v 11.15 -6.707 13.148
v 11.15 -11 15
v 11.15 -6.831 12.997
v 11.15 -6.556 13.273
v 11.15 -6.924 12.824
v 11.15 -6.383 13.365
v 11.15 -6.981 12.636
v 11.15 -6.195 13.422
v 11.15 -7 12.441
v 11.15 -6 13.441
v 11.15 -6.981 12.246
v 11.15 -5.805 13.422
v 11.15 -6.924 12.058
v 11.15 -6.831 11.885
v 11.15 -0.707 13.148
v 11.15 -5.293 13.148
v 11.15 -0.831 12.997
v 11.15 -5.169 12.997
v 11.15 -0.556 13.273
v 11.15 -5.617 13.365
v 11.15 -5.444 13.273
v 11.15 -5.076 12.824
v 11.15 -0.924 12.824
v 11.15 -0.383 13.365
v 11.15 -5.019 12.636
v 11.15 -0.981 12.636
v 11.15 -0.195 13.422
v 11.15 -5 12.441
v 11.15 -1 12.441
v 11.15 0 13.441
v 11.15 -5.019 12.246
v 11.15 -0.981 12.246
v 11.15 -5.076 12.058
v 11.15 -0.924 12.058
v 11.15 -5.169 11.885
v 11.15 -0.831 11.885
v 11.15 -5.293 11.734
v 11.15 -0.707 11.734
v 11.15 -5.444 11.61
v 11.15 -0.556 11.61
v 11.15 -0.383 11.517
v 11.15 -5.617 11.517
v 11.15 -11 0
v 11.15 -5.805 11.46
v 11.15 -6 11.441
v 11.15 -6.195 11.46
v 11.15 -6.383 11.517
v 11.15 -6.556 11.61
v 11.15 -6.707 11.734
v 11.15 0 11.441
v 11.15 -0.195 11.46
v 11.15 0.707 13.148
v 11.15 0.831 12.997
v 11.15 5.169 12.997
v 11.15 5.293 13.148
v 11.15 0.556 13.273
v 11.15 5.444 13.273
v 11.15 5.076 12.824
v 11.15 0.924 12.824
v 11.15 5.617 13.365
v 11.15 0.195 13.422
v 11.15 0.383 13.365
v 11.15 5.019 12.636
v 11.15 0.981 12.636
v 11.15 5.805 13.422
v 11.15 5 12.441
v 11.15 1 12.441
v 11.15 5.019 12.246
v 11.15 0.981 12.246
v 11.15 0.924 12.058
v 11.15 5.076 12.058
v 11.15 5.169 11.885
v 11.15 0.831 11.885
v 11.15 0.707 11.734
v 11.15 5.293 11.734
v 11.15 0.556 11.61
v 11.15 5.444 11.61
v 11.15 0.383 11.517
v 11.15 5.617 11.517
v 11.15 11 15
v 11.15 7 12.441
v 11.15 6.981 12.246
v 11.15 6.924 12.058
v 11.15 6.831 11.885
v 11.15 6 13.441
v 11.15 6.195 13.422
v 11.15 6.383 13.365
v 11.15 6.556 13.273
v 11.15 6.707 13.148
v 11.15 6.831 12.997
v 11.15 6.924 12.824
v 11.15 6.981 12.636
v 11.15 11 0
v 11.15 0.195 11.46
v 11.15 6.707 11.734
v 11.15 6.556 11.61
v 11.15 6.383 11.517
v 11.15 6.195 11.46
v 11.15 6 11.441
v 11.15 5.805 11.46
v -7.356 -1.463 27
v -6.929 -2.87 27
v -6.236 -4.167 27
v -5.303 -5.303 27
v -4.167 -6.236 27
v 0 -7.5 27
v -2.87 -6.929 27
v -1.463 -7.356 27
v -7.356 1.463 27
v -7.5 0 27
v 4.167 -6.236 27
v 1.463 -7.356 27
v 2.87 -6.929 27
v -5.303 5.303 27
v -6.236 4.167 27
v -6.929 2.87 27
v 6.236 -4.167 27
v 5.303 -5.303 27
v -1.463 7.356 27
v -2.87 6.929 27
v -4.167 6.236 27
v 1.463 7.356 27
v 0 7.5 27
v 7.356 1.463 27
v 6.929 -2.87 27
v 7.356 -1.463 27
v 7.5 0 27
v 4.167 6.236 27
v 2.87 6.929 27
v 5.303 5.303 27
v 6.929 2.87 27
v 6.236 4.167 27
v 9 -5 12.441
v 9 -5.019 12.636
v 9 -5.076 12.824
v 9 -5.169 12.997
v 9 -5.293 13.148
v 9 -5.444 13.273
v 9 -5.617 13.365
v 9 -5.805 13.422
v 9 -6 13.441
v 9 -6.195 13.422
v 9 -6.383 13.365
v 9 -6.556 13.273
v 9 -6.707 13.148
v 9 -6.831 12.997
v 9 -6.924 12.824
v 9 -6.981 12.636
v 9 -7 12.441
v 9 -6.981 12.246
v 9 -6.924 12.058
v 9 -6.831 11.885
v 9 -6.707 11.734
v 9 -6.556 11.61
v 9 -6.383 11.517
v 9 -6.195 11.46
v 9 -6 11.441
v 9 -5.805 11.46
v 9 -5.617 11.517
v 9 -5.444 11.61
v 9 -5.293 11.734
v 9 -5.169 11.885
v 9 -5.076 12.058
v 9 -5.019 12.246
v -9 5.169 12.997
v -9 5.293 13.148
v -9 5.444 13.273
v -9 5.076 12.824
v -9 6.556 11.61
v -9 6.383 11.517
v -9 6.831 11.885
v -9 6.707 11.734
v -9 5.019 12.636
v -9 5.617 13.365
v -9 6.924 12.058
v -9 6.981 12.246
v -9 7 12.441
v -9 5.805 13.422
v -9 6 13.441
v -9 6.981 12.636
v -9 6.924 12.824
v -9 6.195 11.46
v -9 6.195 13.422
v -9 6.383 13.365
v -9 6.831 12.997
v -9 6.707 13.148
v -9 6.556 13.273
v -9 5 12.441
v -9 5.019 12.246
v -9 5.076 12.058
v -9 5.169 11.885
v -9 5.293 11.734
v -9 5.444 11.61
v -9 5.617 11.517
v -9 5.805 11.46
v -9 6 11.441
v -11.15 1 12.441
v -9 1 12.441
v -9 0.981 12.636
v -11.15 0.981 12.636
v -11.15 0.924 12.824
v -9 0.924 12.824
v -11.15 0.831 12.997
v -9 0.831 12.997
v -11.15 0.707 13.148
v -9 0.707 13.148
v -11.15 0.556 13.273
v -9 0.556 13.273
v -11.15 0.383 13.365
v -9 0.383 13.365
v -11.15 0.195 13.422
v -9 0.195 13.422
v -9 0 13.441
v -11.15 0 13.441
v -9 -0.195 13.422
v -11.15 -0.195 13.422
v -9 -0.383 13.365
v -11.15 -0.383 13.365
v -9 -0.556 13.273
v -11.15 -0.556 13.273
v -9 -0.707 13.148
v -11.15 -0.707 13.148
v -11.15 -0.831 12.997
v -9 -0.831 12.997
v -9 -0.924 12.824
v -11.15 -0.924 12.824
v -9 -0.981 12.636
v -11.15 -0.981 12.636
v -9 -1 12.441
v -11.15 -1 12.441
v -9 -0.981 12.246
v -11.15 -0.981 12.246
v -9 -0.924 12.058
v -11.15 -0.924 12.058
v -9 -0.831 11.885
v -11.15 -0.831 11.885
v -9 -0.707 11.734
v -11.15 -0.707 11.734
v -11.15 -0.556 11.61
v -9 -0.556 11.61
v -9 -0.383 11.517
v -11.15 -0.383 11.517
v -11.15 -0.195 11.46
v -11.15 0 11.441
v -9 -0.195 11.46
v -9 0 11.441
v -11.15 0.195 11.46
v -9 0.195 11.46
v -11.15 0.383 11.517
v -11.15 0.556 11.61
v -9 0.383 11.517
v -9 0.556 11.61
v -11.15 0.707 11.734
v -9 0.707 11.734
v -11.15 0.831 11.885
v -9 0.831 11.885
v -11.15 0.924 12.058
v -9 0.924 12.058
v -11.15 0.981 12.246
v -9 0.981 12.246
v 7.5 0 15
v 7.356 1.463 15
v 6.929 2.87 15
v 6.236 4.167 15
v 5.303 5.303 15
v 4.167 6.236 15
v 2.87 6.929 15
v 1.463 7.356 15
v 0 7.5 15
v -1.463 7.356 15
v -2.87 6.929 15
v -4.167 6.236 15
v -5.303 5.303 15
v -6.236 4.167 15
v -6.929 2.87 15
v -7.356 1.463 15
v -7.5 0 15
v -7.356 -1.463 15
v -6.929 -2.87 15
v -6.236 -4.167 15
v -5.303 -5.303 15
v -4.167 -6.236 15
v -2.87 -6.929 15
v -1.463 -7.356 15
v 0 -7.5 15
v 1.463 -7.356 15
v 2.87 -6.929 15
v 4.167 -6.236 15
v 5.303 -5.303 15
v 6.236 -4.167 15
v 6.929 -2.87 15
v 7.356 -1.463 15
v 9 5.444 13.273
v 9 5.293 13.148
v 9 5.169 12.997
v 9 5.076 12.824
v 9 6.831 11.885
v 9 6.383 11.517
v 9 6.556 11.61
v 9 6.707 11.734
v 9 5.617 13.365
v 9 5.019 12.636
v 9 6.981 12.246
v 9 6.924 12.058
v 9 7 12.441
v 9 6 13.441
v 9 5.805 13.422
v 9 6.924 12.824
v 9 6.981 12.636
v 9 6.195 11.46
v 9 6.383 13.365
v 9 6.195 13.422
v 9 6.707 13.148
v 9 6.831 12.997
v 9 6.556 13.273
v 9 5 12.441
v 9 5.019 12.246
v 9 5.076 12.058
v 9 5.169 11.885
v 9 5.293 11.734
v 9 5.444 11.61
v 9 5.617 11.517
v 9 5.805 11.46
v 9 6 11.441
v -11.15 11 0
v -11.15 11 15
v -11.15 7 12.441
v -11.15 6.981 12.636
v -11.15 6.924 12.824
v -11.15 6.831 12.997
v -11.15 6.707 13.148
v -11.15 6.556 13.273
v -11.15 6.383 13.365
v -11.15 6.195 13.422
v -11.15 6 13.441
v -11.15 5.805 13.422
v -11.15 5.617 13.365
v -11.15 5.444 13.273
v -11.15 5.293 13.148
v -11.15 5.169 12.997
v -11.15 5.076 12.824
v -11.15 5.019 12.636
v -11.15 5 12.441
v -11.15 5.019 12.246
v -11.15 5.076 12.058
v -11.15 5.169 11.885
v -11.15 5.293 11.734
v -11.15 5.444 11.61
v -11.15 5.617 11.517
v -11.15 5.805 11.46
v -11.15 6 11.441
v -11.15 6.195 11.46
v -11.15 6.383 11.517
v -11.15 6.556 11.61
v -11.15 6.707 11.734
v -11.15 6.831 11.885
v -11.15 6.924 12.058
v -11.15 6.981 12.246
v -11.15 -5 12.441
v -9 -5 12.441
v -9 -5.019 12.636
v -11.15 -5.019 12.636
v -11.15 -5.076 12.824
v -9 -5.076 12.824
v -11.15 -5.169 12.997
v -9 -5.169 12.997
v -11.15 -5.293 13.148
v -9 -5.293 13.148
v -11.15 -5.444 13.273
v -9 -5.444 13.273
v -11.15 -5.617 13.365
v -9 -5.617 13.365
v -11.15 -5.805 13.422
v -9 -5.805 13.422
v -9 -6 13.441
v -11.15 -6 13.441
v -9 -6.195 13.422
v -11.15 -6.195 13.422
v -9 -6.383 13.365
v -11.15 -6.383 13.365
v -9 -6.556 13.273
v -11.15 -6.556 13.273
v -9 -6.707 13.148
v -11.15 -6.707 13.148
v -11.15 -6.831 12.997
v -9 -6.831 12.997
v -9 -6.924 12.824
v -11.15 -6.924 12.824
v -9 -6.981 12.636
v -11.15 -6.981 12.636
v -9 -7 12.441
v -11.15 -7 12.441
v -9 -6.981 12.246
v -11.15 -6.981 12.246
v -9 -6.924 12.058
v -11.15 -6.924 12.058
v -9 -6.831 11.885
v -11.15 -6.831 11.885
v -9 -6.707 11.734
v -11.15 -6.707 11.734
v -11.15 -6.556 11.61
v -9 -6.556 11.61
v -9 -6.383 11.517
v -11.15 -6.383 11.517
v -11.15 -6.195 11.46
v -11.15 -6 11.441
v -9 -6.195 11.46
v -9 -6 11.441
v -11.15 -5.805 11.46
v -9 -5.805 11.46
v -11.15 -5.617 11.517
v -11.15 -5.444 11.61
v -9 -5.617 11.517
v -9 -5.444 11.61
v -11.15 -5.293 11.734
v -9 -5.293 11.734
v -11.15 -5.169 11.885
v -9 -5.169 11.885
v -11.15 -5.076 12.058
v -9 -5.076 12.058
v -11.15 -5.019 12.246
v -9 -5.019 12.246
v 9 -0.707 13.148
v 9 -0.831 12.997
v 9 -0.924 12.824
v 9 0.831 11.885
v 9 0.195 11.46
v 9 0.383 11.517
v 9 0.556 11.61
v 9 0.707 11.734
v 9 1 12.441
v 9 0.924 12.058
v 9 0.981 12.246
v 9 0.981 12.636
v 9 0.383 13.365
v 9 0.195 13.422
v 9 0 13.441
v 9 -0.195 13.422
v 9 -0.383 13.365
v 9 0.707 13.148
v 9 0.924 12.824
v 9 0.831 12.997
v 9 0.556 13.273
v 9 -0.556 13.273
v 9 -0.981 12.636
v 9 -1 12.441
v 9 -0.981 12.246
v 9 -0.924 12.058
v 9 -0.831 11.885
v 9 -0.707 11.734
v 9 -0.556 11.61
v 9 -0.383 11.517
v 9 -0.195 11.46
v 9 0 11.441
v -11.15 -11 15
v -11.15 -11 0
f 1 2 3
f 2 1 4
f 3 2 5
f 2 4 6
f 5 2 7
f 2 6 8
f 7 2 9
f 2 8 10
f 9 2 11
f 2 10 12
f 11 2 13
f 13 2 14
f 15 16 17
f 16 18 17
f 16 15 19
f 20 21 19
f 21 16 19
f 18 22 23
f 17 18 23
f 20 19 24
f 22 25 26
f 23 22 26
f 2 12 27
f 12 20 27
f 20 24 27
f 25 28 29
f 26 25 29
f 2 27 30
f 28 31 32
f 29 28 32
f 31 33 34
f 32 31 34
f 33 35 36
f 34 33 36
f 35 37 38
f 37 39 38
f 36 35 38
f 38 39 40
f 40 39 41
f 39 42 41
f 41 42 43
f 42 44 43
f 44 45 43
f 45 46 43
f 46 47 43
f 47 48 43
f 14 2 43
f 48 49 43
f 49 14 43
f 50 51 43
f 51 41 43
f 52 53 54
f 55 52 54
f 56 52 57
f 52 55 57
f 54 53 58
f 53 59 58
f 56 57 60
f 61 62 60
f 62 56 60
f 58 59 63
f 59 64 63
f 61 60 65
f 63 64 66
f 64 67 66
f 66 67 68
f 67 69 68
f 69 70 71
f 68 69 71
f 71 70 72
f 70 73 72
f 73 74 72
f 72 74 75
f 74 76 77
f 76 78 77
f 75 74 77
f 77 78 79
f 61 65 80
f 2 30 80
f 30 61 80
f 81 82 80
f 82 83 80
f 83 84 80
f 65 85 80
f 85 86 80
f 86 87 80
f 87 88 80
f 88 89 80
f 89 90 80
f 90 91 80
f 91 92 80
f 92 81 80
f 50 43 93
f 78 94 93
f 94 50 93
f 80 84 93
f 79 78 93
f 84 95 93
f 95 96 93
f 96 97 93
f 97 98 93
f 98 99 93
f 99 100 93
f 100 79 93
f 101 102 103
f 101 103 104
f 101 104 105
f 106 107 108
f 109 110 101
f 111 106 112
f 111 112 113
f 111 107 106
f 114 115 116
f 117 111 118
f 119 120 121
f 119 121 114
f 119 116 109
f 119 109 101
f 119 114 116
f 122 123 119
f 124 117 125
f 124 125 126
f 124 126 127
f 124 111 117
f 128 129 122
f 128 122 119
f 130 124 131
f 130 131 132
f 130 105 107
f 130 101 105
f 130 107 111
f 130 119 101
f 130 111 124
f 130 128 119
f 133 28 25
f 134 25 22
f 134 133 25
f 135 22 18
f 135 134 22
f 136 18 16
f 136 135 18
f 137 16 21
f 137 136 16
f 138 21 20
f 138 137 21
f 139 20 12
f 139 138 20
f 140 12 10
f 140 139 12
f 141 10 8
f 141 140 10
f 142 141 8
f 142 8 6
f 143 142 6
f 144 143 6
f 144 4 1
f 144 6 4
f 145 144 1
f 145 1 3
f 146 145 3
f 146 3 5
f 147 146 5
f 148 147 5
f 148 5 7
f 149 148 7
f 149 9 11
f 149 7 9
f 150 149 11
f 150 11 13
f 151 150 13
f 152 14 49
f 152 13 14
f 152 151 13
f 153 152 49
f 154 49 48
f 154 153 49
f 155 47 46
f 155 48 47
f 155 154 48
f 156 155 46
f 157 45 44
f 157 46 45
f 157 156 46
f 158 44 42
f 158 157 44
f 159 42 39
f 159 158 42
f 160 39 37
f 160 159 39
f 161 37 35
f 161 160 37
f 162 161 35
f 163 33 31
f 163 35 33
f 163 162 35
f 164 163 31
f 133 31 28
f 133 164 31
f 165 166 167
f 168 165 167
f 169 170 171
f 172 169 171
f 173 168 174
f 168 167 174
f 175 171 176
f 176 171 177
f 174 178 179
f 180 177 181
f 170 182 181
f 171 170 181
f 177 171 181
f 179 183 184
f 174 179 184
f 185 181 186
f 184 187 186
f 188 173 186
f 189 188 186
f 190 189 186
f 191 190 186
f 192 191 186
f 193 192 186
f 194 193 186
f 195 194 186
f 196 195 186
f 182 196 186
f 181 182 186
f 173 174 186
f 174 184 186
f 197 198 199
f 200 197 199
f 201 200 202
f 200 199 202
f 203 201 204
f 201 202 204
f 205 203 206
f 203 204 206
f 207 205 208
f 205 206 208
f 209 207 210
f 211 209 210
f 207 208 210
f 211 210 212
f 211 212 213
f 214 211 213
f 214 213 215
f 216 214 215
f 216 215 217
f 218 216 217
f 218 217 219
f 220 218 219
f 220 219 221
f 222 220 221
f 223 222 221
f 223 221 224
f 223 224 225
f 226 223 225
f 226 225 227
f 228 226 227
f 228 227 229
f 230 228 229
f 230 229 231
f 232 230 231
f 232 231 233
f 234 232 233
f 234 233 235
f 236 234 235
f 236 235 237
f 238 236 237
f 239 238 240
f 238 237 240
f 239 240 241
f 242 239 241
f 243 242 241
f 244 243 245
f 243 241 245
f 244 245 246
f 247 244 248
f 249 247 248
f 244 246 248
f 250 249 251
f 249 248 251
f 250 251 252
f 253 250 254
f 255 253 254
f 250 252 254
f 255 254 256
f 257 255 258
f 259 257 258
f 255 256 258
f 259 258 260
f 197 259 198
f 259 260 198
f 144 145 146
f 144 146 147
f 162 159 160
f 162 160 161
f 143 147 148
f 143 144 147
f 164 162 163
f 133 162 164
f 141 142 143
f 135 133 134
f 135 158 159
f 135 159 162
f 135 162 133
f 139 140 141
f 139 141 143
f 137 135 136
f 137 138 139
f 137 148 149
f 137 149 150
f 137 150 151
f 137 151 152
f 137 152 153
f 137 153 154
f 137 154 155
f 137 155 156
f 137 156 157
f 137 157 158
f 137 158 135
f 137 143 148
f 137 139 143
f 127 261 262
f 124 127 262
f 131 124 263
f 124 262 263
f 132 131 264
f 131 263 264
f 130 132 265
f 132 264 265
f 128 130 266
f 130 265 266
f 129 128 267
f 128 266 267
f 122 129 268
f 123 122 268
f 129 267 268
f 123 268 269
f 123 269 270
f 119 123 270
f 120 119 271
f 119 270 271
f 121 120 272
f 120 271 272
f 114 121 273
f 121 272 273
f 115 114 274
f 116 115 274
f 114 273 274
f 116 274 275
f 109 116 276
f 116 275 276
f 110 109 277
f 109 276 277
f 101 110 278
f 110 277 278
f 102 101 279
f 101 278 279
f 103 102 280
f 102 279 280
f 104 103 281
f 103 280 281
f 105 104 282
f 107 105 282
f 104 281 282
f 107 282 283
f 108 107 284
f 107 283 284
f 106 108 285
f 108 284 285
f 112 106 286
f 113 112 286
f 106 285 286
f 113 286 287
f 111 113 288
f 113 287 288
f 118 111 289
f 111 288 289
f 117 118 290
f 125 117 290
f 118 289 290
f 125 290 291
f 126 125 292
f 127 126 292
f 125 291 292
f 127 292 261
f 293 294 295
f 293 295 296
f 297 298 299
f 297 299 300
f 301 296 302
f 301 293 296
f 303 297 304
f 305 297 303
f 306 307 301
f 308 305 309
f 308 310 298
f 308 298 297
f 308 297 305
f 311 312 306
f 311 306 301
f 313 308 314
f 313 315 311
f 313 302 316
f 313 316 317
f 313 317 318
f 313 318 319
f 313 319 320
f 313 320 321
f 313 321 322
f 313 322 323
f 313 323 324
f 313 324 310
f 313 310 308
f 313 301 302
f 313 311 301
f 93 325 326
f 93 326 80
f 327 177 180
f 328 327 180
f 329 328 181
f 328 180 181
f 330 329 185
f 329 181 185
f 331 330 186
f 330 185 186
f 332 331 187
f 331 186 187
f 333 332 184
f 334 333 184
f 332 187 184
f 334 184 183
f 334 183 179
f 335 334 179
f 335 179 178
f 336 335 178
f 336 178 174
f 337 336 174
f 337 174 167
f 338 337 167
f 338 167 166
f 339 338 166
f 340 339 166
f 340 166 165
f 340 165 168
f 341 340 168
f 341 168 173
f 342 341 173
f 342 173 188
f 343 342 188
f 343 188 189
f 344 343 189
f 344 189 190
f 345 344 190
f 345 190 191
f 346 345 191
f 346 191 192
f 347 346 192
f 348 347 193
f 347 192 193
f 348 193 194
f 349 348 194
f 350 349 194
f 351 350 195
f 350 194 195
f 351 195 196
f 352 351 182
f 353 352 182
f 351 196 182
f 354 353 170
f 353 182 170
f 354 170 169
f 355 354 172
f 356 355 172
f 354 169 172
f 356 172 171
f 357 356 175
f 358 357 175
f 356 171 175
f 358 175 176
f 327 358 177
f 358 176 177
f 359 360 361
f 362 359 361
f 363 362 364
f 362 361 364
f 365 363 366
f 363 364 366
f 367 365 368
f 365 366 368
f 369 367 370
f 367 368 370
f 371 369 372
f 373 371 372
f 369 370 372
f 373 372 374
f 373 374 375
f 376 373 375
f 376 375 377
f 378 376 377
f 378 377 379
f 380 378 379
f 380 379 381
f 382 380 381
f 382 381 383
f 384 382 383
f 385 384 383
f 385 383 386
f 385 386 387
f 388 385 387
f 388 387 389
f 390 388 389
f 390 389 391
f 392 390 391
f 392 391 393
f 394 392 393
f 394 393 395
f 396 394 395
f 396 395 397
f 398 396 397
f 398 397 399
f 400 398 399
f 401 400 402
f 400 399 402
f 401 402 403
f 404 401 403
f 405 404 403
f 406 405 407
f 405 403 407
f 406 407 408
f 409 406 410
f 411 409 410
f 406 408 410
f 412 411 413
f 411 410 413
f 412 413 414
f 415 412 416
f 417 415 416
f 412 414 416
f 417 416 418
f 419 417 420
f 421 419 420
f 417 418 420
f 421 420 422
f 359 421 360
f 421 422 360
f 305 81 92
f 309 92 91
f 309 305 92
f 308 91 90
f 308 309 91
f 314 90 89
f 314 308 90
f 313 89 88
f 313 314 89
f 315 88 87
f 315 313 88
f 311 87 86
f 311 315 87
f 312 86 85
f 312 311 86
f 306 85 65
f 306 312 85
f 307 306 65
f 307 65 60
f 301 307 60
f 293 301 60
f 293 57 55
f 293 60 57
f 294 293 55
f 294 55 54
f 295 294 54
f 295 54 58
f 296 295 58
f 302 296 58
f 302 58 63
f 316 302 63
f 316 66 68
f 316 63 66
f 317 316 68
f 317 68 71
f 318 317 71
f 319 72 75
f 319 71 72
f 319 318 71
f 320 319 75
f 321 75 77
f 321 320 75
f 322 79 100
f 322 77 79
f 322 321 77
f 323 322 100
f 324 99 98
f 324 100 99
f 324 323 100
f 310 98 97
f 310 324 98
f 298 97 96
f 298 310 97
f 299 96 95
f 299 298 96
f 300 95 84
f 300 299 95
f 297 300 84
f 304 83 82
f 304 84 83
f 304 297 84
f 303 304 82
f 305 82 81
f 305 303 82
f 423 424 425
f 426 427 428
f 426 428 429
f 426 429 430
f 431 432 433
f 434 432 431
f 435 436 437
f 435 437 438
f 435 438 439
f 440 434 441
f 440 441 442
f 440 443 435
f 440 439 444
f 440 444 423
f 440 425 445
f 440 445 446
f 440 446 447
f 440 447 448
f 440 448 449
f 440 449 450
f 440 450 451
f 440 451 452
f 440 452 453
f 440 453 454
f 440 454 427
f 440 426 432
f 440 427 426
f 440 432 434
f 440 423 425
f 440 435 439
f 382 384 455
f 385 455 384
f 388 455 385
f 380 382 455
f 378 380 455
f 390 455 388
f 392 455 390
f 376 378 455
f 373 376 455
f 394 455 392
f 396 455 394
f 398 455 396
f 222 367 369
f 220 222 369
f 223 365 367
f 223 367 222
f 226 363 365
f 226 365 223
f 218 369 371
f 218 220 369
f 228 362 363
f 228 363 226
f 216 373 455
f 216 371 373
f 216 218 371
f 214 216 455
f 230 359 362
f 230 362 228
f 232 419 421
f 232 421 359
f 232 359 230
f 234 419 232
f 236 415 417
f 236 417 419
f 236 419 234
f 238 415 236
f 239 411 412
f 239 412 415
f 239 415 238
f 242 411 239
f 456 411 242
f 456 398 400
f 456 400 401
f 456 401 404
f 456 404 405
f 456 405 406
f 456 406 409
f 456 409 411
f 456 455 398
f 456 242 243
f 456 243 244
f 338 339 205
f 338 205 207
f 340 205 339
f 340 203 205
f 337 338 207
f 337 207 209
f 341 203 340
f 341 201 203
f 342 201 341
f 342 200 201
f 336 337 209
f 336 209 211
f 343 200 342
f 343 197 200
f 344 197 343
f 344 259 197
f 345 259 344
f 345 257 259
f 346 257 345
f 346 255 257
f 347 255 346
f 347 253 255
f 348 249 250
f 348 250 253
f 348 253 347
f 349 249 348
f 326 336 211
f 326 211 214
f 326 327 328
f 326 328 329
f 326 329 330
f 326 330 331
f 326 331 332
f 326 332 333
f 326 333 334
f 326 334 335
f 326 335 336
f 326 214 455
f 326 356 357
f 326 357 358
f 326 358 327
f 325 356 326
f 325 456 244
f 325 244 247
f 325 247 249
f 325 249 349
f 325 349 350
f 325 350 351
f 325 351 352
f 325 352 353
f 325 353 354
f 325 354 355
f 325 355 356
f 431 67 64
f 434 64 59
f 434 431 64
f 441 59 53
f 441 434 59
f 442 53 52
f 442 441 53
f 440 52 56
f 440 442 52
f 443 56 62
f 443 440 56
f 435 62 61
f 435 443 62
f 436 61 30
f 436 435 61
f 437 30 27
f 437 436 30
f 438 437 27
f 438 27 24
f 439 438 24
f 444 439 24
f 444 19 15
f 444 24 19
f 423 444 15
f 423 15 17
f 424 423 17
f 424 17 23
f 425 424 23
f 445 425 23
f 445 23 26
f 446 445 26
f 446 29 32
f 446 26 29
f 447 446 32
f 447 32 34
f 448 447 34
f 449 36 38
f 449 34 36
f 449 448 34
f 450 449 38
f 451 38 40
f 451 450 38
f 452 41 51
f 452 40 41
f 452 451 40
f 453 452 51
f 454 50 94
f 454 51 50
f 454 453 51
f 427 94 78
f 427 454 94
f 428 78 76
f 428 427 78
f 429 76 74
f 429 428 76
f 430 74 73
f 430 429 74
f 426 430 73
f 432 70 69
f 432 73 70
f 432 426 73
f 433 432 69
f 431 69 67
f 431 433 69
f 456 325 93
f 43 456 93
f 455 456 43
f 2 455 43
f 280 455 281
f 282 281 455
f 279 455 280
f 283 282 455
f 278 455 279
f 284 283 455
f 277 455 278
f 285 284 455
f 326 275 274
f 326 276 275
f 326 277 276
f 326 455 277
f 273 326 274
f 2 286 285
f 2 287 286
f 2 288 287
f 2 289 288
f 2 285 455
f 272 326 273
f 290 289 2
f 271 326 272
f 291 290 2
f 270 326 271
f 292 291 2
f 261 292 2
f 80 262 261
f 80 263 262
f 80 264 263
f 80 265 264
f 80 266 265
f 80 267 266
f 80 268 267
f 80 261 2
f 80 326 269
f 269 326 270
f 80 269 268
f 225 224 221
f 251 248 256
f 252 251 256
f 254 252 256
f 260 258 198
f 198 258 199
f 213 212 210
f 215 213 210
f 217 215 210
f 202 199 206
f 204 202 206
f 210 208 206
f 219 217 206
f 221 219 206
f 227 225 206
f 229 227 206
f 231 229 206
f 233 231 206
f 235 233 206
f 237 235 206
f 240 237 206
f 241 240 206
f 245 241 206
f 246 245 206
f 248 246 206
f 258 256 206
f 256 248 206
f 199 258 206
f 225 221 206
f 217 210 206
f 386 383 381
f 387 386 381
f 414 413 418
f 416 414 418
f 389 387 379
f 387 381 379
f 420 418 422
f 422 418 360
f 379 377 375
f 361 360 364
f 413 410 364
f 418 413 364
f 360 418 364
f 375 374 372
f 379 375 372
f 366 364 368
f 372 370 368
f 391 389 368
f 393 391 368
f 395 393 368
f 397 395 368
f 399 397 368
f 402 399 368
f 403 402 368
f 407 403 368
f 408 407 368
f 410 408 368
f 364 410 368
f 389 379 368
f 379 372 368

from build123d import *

# Parameters (mm, degrees)
F0_W     = 22.3
F0_H     = 22
F1_DEPTH = 15
F3_START = 15
F2_R     = 7.5
F3_DEPTH = 12
F5_START = -9
F4_R     = 1
F5_DEPTH = 3
F6_START = 9
F6_DEPTH = 4


with BuildPart() as f1:
    # F0 (on Top) → F1 (new body)
    with BuildSketch(Plane.XY):
        Rectangle(F0_W, F0_H)
    extrude(amount=F1_DEPTH)

    # F2 (on Top) → F3 (join)
    with BuildSketch(Plane.XY.offset(F3_START)):
        Circle(F2_R)
    extrude(amount=F3_DEPTH)

    # F4 (on Right) → F5 (cut)
    with BuildSketch(Plane.YZ.offset(F5_START)):
        with Locations((6, 12.4410456046)):
            Circle(F4_R)
        with Locations((0, 12.4410456046)):
            Circle(F4_R)
        with Locations((-6, 12.4410456046)):
            Circle(F4_R)
    extrude(amount=-F5_DEPTH, mode=Mode.SUBTRACT)

    # F4 (on Right) → F6 (cut)
    with BuildSketch(Plane.YZ.offset(F6_START)):
        with Locations((6, 12.4410456046)):
            Circle(F4_R)
        with Locations((0, 12.4410456046)):
            Circle(F4_R)
        with Locations((-6, 12.4410456046)):
            Circle(F4_R)
    extrude(amount=F6_DEPTH, mode=Mode.SUBTRACT)


solid = f1.part
